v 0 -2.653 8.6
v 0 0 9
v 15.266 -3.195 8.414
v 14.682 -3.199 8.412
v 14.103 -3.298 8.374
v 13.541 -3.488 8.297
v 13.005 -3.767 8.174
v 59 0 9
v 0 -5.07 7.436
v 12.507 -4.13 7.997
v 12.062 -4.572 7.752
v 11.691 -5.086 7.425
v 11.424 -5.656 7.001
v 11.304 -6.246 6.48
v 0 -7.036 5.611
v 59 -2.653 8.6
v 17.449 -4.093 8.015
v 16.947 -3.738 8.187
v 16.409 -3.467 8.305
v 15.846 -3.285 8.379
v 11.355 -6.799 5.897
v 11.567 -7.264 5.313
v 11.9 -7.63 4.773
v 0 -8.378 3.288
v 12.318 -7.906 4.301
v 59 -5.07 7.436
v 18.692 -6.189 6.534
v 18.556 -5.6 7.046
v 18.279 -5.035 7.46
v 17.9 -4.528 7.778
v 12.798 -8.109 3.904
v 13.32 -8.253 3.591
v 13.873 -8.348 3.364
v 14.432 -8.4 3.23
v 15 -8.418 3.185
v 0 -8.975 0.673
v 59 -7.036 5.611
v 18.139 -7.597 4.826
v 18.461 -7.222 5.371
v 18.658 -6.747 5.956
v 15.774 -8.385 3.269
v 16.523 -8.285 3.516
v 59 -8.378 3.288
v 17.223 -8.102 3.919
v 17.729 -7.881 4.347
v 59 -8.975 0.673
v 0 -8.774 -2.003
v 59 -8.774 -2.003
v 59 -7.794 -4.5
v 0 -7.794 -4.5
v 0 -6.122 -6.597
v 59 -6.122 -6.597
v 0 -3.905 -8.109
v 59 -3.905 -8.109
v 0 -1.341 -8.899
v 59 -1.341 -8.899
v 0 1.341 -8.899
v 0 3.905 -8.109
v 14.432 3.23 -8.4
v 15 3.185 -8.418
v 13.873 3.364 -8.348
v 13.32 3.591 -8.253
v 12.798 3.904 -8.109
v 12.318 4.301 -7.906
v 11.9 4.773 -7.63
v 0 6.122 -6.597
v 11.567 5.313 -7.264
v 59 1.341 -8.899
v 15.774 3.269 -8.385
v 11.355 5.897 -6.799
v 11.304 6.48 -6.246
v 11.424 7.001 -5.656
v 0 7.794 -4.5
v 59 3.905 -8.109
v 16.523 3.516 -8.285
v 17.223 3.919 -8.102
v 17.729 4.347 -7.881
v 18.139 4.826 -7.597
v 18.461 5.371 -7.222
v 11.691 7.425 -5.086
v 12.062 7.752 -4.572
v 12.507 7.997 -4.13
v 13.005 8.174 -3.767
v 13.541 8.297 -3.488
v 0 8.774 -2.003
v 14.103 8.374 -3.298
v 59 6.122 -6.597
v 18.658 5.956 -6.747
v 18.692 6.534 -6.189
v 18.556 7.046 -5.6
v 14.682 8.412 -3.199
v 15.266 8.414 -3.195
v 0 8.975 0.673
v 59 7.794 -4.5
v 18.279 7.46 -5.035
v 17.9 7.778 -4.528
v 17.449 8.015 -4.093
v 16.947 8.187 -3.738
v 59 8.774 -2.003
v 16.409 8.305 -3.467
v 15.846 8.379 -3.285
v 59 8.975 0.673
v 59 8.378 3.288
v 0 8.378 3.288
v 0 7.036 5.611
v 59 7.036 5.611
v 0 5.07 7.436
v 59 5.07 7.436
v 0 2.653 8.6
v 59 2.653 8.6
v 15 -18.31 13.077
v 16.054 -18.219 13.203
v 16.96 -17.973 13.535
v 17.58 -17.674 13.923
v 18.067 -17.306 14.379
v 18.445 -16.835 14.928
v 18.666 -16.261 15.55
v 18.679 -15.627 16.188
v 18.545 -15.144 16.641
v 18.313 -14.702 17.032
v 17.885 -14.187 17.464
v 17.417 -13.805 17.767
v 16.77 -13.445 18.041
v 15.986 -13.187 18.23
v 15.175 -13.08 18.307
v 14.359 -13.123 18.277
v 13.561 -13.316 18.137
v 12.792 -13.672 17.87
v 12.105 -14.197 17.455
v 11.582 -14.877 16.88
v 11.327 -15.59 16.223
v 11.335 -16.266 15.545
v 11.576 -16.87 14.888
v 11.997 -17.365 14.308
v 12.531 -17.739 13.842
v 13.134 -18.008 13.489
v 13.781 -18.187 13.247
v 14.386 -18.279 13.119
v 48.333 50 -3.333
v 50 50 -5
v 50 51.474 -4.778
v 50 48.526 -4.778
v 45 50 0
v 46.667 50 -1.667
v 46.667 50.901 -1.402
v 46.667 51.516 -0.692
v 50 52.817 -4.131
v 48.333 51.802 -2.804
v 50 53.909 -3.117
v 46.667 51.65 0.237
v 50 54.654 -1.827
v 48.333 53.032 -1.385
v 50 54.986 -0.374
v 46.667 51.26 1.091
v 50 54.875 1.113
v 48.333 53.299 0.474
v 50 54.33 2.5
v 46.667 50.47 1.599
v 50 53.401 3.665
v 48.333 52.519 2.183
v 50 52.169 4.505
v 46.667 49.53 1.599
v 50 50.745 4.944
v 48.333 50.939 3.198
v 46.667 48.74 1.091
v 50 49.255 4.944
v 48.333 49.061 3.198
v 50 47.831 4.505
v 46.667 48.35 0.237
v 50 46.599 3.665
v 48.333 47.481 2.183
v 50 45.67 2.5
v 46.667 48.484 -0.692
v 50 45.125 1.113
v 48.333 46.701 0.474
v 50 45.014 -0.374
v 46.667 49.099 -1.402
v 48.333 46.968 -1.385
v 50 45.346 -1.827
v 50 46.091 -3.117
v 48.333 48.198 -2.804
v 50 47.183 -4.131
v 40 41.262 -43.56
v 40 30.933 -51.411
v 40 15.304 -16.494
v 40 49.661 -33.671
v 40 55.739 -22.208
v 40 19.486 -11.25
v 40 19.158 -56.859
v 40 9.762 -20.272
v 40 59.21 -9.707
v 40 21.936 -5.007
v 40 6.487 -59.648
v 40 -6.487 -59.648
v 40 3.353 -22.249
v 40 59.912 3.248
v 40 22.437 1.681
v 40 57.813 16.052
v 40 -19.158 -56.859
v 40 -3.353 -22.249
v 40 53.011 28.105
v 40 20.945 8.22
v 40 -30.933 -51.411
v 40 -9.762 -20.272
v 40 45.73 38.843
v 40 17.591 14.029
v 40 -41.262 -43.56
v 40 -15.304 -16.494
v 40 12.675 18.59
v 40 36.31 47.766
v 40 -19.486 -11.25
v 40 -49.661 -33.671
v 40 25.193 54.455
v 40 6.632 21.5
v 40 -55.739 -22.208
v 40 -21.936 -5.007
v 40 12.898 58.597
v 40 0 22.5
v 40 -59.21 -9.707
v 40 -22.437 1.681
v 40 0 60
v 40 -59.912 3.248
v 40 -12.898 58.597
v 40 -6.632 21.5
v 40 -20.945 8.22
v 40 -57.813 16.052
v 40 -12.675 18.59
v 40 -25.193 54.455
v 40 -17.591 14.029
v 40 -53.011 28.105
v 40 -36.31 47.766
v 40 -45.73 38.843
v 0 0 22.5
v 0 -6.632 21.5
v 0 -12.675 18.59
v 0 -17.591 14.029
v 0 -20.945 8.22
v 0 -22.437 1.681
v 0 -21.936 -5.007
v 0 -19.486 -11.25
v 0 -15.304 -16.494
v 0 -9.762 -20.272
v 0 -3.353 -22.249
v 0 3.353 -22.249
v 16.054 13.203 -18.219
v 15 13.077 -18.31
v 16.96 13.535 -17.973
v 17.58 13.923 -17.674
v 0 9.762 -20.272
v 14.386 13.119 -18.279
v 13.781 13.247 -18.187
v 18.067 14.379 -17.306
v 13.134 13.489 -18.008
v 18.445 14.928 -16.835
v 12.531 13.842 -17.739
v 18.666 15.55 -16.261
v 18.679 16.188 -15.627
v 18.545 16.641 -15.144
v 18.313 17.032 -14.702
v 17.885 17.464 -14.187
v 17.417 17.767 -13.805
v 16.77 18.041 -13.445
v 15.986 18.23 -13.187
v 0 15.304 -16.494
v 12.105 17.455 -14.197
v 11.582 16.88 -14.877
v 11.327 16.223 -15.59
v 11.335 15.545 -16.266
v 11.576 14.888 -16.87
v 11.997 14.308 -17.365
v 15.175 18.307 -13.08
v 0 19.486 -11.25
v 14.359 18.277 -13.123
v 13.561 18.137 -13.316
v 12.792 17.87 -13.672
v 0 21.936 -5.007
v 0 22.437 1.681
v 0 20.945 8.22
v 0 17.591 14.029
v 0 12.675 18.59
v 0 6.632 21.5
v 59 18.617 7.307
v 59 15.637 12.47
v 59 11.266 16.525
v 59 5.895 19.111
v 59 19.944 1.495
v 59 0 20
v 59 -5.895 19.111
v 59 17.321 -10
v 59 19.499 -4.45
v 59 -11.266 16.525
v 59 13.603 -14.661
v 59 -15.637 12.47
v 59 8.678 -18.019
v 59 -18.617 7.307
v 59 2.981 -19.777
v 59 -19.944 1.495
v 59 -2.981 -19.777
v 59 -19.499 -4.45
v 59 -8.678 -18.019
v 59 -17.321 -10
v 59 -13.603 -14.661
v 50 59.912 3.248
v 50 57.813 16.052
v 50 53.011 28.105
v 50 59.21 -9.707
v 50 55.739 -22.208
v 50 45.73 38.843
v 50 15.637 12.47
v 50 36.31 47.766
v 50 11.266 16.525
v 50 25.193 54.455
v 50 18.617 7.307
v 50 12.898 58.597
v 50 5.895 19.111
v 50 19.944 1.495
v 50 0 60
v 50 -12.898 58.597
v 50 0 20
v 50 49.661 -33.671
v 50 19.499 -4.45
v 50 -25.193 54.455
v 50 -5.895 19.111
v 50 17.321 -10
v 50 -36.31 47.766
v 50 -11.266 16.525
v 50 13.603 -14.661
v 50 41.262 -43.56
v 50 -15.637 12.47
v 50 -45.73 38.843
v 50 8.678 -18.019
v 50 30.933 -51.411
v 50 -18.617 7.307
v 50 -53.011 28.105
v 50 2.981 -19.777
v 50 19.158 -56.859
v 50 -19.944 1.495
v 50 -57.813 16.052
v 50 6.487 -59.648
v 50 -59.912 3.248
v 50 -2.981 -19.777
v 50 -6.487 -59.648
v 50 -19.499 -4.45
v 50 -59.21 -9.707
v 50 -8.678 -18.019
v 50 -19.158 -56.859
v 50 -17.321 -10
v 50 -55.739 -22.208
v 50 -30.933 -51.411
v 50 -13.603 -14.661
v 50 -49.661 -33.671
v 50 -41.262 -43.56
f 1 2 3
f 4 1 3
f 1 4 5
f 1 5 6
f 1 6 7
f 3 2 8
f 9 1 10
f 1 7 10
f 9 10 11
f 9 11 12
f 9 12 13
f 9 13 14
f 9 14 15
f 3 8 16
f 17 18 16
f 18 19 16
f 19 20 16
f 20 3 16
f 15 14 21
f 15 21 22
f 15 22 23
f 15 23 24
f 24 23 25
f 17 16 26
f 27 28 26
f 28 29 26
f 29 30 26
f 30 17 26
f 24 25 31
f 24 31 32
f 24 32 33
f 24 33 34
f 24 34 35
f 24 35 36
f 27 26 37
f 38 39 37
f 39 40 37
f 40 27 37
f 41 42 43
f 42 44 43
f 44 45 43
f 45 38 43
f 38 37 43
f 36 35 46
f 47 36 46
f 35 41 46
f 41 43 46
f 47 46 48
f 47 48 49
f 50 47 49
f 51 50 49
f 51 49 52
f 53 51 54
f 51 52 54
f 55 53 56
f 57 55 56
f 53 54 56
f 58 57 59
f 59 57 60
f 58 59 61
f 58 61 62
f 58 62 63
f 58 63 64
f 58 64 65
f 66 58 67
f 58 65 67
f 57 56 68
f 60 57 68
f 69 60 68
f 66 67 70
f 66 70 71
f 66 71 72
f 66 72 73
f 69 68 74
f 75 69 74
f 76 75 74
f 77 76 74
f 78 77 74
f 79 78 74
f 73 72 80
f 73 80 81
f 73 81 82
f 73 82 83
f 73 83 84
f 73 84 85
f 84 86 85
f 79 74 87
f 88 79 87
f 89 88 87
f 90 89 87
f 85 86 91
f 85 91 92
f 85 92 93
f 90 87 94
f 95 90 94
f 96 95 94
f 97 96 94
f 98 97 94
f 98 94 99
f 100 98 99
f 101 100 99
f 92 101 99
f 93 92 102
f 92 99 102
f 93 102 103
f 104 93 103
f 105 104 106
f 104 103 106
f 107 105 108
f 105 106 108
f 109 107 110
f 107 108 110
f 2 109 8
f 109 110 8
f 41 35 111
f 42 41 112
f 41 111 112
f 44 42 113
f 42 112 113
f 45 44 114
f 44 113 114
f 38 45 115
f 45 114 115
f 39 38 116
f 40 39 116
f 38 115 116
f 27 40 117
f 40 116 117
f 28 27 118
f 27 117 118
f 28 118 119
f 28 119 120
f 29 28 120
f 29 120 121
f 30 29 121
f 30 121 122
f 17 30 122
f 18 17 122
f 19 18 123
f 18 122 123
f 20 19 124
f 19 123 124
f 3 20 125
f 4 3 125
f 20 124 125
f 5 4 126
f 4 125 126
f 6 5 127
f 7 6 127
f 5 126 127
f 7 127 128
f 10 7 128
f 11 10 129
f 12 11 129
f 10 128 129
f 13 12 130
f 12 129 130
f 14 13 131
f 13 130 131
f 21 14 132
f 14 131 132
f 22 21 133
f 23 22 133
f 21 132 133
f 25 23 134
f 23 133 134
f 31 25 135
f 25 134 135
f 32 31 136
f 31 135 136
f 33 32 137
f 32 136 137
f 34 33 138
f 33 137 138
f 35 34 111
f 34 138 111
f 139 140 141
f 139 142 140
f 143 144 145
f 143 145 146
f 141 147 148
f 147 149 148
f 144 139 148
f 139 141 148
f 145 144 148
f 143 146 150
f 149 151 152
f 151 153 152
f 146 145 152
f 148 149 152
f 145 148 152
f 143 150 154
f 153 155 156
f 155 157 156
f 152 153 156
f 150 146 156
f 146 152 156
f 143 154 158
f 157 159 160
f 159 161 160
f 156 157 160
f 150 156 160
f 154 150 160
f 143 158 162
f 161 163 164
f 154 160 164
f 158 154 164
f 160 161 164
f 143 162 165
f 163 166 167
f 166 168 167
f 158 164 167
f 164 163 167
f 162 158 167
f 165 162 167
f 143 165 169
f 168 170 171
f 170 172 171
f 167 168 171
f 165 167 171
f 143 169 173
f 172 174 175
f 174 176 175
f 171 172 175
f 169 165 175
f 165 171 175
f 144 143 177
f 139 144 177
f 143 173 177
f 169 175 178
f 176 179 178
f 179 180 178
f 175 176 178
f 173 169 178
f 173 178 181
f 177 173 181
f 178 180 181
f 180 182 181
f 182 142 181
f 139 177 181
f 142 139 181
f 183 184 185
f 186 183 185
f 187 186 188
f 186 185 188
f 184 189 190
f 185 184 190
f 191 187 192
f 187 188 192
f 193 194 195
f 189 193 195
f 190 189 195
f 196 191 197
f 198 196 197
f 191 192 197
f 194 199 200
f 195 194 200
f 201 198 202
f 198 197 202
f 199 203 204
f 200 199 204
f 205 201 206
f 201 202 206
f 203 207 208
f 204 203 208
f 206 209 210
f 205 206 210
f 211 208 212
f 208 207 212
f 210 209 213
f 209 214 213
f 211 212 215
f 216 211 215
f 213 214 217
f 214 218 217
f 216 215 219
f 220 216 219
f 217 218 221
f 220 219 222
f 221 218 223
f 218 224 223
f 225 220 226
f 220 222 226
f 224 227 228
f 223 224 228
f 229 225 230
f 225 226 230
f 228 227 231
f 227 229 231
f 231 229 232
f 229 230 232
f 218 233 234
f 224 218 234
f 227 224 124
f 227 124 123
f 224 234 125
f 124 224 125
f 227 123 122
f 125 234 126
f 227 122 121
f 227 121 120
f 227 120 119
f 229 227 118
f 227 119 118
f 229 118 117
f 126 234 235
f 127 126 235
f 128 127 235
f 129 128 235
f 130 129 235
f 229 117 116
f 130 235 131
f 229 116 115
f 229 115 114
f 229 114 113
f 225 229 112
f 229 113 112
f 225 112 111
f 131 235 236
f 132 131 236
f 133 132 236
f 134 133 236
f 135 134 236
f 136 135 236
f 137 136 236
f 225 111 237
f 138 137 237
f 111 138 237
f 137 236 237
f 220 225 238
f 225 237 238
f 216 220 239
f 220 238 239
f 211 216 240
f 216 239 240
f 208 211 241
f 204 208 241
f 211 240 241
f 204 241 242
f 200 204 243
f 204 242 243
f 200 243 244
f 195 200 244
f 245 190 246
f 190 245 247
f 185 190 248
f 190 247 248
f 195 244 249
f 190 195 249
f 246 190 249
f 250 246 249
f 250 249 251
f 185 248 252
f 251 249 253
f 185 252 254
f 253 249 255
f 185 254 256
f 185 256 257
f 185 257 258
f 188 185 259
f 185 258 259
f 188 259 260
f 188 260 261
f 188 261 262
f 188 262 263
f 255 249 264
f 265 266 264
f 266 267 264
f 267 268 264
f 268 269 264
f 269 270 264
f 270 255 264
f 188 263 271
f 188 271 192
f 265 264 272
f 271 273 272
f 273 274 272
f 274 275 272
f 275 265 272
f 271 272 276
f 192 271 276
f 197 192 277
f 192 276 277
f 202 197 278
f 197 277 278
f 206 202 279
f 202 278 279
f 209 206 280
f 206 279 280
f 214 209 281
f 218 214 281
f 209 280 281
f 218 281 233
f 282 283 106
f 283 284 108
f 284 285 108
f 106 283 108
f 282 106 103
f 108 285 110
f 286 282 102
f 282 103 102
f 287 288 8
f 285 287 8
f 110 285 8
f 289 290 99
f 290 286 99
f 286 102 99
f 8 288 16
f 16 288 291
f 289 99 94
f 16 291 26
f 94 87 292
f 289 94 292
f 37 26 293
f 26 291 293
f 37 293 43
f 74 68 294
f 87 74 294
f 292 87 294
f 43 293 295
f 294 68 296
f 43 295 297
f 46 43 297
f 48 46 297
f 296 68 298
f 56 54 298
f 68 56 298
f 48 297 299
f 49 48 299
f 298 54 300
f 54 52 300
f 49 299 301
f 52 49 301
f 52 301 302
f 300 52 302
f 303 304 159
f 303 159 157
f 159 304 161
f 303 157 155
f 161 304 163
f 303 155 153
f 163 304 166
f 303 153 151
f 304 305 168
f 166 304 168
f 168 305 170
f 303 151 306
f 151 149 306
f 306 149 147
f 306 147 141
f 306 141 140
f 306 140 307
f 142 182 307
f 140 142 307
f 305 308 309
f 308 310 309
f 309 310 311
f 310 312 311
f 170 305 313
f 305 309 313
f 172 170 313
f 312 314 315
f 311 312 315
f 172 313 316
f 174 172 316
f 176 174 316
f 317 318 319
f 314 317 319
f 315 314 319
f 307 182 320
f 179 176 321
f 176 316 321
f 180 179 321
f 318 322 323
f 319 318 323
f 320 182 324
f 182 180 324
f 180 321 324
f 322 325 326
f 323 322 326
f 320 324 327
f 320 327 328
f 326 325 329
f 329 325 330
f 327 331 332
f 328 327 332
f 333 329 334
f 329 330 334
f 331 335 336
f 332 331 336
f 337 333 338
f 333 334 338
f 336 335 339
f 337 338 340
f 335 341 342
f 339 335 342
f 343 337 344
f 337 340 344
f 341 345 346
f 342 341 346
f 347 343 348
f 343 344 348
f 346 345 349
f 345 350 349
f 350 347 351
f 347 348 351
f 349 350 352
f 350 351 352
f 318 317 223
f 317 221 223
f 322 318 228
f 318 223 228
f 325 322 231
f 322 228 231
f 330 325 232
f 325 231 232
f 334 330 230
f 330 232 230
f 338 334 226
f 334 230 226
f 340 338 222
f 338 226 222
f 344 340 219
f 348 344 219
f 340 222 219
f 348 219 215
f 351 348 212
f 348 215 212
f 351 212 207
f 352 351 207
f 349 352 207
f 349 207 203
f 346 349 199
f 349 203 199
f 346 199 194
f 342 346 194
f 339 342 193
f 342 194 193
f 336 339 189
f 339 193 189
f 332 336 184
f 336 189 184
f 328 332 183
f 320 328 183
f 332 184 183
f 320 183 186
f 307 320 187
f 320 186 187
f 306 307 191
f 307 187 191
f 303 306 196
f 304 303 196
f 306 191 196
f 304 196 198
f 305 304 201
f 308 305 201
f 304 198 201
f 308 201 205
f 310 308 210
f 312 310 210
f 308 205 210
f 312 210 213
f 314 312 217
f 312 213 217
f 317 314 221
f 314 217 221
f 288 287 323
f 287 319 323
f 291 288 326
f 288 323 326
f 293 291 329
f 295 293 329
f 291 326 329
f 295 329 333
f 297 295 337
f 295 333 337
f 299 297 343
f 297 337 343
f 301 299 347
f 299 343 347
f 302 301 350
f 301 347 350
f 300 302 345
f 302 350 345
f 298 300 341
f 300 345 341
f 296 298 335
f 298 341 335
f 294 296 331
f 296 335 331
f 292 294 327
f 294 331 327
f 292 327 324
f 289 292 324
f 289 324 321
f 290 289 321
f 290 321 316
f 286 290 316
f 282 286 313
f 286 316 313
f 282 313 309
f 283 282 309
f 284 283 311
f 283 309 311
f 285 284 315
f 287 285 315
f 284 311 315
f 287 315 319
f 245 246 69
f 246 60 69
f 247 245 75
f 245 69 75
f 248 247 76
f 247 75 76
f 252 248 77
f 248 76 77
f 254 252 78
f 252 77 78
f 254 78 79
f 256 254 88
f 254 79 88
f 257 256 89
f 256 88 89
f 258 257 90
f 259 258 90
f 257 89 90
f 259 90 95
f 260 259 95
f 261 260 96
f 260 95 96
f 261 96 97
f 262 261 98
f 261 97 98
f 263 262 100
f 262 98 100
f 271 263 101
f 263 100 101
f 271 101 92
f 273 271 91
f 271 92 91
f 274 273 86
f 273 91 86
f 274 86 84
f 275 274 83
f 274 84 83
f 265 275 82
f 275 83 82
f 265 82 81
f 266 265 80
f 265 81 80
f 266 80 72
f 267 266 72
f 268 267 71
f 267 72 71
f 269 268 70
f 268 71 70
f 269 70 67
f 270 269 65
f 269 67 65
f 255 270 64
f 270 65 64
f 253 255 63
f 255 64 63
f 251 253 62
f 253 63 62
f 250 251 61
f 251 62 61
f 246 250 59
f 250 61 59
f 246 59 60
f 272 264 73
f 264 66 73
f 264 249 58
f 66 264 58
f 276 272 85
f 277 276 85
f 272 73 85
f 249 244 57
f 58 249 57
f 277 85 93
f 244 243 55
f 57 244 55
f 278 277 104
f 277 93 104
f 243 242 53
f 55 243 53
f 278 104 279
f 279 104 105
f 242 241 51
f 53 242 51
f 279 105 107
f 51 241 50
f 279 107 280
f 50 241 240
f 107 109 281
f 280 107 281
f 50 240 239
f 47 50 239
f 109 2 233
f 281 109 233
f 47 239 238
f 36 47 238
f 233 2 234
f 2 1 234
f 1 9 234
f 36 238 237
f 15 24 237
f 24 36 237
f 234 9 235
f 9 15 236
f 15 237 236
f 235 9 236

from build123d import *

# Parameters (mm, degrees)
ESQUISSE4_R             = 3.7
ENL_V_MAT_EXTRU_2_DEPTH = 25


with BuildPart() as part:
    # Esquisse1 → Base-Révolution (revolve)
    with BuildSketch(Plane.XY, mode=Mode.PRIVATE) as base_r_volution_sk:
        Polygon((0, 9), (59, 9), (59, 20), (50, 20), (50, 60), (40, 60), (40, 22.5), (0, 22.5), align=None)
    revolve(base_r_volution_sk.sketch.rotate(Axis((-20, 0, 0), (1, 0, 0)), 90), axis=Axis((-20, 0, 0), (1, 0, 0)))

    # Esquisse2 → Enlèvement de matière-Révolution1 (revolve, cut)
    with BuildSketch(Plane.XY, mode=Mode.PRIVATE) as enl_vement_de_mati_re_r_volution1_sk:
        Polygon((45, 50), (50, 55), (50, 50), align=None)
    revolve(enl_vement_de_mati_re_r_volution1_sk.sketch.rotate(Axis((21.308708687, 50, 0), (1, 0, 0)), 270), axis=Axis((21.308708687, 50, 0), (1, 0, 0)), mode=Mode.SUBTRACT)

    # Esquisse4 → Enlèv. mat.-Extru.2 (cut, symmetric)
    with BuildSketch(Plane(origin=(0, 0, 0), x_dir=(1, 0, 0), z_dir=(0, -0.7071067811865488, 0.7071067811865462))):
        with Locations(Location((15, 0, 0), (0, 0, 270))):
            Circle(ESQUISSE4_R)
    extrude(amount=ENL_V_MAT_EXTRU_2_DEPTH, both=True, mode=Mode.SUBTRACT)


solid = part.part
